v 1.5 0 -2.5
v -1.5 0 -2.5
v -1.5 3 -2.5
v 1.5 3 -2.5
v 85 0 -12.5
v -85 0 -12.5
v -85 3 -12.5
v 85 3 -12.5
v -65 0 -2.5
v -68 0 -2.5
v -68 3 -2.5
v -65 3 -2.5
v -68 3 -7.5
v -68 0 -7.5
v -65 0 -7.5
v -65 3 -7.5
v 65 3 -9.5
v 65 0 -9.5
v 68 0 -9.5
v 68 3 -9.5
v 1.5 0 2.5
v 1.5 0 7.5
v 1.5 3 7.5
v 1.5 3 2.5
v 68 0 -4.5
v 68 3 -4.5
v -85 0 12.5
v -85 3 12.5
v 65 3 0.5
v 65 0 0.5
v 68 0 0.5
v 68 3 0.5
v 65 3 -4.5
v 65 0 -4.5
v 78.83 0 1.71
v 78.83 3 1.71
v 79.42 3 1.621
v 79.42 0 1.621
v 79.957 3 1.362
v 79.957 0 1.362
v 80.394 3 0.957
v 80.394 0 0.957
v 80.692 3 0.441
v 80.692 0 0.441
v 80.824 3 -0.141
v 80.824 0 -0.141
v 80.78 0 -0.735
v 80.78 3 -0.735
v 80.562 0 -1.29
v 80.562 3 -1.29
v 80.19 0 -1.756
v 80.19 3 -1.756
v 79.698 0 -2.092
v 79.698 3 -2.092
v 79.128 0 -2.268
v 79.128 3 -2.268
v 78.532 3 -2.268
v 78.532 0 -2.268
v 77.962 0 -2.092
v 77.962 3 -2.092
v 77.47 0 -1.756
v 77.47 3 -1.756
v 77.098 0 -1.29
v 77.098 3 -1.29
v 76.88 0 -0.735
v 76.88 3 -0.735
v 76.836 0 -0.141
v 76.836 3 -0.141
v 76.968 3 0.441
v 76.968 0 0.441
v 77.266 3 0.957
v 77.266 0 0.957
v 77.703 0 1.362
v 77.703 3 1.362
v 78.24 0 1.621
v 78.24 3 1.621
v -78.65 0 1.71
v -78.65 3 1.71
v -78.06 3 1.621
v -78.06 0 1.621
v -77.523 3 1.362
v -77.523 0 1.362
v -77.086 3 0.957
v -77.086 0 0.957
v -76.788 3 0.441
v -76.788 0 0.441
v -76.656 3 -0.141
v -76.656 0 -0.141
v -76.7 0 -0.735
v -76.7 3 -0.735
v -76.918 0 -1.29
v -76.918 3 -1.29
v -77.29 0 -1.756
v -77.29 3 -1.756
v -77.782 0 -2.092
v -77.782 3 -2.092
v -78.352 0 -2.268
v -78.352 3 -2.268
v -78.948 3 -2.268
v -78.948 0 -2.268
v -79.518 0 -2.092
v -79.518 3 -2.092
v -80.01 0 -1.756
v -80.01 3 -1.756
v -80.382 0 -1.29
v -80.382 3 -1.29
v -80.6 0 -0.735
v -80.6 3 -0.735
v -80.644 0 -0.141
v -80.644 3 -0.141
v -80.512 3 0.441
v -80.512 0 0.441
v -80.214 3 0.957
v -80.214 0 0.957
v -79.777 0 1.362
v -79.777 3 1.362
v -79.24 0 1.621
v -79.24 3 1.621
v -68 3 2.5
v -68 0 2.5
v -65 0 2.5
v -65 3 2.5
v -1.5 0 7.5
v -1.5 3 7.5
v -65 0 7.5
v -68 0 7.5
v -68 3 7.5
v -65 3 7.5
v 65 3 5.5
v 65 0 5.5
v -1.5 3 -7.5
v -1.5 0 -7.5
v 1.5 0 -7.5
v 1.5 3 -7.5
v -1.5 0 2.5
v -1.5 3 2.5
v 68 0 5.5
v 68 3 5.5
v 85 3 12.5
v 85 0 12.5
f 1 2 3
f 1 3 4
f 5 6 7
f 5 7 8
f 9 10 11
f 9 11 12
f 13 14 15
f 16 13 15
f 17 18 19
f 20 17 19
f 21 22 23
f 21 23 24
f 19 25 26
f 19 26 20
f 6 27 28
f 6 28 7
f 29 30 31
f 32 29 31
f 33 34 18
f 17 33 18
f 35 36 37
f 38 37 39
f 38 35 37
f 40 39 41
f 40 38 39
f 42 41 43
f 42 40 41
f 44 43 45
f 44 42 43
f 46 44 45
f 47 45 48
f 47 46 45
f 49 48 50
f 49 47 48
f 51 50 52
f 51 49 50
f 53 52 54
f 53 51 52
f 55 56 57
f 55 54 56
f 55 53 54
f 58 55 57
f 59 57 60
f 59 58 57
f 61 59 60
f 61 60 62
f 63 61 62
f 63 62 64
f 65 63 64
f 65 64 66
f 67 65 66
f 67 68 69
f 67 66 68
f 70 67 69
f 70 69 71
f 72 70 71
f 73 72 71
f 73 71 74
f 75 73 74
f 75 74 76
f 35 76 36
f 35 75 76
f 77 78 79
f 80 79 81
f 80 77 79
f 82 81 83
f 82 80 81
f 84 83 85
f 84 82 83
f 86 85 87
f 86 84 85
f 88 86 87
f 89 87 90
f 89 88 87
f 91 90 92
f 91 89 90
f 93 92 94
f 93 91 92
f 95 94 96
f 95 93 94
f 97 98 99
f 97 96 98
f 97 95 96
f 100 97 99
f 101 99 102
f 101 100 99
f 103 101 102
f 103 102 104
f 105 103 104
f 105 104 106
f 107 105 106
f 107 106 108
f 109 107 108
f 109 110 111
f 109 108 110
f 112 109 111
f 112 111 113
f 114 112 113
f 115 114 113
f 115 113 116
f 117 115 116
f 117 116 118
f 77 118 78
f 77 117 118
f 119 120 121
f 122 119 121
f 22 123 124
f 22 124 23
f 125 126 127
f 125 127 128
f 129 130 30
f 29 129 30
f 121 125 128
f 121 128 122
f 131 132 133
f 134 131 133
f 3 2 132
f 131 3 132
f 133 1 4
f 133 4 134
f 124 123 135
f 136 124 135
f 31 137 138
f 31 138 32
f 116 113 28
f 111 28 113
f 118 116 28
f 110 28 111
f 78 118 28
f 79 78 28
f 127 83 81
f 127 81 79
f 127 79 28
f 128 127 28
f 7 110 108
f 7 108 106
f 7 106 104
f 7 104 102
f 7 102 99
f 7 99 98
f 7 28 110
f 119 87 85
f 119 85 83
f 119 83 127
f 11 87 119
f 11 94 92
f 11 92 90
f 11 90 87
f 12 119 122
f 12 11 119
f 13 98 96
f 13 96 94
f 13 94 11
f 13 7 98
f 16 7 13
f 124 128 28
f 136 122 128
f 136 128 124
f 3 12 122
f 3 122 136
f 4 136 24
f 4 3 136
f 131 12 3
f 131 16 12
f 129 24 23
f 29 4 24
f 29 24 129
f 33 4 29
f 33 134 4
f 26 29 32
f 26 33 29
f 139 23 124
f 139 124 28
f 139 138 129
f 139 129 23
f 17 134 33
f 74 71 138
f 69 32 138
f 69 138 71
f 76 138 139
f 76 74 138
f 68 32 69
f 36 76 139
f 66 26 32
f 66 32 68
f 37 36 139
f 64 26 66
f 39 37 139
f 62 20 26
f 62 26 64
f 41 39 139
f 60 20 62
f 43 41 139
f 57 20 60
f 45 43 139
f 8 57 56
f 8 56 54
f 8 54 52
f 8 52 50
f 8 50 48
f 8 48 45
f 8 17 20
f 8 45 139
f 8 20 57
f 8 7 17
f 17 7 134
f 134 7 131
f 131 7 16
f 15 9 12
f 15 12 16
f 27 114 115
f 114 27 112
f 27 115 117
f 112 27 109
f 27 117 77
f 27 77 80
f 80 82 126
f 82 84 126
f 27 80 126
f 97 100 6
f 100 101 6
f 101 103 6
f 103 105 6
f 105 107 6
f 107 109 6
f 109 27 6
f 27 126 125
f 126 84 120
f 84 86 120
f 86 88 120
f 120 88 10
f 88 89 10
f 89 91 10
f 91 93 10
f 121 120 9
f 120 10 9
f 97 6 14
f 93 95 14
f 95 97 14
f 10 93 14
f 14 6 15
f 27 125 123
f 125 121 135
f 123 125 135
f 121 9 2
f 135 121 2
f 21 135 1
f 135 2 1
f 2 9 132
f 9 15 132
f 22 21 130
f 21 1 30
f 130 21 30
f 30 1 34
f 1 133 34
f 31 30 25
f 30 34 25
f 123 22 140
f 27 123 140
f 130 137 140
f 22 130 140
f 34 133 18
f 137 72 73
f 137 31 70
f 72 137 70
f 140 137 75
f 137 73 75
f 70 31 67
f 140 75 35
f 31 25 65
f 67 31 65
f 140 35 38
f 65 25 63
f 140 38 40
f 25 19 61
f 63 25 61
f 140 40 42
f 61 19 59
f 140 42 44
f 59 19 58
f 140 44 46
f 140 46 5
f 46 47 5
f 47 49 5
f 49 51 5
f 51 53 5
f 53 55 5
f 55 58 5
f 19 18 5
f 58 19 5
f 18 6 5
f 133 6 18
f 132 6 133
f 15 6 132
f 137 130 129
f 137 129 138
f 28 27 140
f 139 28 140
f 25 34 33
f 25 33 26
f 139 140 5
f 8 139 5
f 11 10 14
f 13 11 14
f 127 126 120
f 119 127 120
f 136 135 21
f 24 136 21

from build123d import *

# Parameters (mm, degrees)
SKICA1_W                 = 170
SKICA1_H                 = 25
P_IDAT_VYSUNUT_M1_DEPTH  = 3
SKICA2_W                 = 3
SKICA2_H                 = 5
ODEBRAT_VYSUNUT_M2_DEPTH = 86.966563267
SKICA3_R                 = 2
ODEBRAT_VYSUNUT_M3_DEPTH = 86.966563267


with BuildPart() as part:
    # Skica1 → Přidat vysunutím1 (new body)
    with BuildSketch(Plane(origin=(0, 0, 0), x_dir=(1, 0, 0), z_dir=(0, 1, 0))):
        Rectangle(SKICA1_W, SKICA1_H)
    extrude(amount=P_IDAT_VYSUNUT_M1_DEPTH)

    # Skica2 → Odebrat vysunutím2 (cut, through all)
    with BuildSketch(Plane(origin=(0, 0, 0), x_dir=(1, 0, 0), z_dir=(0, 1, 0))):
        with Locations((0, 5)):
            Rectangle(SKICA2_W, SKICA2_H)
        with Locations((0, -5)):
            Rectangle(SKICA2_W, SKICA2_H)
        with Locations((-66.5, 5)):
            Rectangle(SKICA2_W, SKICA2_H)
        with Locations((-66.5, -5)):
            Rectangle(SKICA2_W, SKICA2_H)
        with Locations((66.5, 7)):
            Rectangle(SKICA2_W, SKICA2_H)
        with Locations((66.5, -3)):
            Rectangle(SKICA2_W, SKICA2_H)
    extrude(amount=ODEBRAT_VYSUNUT_M2_DEPTH, mode=Mode.SUBTRACT)

    # Skica3 → Odebrat vysunutím3 (cut, through all)
    with BuildSketch(Plane(origin=(0, 0, 0), x_dir=(1, 0, 0), z_dir=(0, 1, 0))):
        with Locations(Location((-78.65, 0.29, 0), (0, 0, 270))):
            Circle(SKICA3_R)
        with Locations(Location((78.83, 0.29, 0), (0, 0, 270))):
            Circle(SKICA3_R)
    extrude(amount=ODEBRAT_VYSUNUT_M3_DEPTH, mode=Mode.SUBTRACT)


solid = part.part
